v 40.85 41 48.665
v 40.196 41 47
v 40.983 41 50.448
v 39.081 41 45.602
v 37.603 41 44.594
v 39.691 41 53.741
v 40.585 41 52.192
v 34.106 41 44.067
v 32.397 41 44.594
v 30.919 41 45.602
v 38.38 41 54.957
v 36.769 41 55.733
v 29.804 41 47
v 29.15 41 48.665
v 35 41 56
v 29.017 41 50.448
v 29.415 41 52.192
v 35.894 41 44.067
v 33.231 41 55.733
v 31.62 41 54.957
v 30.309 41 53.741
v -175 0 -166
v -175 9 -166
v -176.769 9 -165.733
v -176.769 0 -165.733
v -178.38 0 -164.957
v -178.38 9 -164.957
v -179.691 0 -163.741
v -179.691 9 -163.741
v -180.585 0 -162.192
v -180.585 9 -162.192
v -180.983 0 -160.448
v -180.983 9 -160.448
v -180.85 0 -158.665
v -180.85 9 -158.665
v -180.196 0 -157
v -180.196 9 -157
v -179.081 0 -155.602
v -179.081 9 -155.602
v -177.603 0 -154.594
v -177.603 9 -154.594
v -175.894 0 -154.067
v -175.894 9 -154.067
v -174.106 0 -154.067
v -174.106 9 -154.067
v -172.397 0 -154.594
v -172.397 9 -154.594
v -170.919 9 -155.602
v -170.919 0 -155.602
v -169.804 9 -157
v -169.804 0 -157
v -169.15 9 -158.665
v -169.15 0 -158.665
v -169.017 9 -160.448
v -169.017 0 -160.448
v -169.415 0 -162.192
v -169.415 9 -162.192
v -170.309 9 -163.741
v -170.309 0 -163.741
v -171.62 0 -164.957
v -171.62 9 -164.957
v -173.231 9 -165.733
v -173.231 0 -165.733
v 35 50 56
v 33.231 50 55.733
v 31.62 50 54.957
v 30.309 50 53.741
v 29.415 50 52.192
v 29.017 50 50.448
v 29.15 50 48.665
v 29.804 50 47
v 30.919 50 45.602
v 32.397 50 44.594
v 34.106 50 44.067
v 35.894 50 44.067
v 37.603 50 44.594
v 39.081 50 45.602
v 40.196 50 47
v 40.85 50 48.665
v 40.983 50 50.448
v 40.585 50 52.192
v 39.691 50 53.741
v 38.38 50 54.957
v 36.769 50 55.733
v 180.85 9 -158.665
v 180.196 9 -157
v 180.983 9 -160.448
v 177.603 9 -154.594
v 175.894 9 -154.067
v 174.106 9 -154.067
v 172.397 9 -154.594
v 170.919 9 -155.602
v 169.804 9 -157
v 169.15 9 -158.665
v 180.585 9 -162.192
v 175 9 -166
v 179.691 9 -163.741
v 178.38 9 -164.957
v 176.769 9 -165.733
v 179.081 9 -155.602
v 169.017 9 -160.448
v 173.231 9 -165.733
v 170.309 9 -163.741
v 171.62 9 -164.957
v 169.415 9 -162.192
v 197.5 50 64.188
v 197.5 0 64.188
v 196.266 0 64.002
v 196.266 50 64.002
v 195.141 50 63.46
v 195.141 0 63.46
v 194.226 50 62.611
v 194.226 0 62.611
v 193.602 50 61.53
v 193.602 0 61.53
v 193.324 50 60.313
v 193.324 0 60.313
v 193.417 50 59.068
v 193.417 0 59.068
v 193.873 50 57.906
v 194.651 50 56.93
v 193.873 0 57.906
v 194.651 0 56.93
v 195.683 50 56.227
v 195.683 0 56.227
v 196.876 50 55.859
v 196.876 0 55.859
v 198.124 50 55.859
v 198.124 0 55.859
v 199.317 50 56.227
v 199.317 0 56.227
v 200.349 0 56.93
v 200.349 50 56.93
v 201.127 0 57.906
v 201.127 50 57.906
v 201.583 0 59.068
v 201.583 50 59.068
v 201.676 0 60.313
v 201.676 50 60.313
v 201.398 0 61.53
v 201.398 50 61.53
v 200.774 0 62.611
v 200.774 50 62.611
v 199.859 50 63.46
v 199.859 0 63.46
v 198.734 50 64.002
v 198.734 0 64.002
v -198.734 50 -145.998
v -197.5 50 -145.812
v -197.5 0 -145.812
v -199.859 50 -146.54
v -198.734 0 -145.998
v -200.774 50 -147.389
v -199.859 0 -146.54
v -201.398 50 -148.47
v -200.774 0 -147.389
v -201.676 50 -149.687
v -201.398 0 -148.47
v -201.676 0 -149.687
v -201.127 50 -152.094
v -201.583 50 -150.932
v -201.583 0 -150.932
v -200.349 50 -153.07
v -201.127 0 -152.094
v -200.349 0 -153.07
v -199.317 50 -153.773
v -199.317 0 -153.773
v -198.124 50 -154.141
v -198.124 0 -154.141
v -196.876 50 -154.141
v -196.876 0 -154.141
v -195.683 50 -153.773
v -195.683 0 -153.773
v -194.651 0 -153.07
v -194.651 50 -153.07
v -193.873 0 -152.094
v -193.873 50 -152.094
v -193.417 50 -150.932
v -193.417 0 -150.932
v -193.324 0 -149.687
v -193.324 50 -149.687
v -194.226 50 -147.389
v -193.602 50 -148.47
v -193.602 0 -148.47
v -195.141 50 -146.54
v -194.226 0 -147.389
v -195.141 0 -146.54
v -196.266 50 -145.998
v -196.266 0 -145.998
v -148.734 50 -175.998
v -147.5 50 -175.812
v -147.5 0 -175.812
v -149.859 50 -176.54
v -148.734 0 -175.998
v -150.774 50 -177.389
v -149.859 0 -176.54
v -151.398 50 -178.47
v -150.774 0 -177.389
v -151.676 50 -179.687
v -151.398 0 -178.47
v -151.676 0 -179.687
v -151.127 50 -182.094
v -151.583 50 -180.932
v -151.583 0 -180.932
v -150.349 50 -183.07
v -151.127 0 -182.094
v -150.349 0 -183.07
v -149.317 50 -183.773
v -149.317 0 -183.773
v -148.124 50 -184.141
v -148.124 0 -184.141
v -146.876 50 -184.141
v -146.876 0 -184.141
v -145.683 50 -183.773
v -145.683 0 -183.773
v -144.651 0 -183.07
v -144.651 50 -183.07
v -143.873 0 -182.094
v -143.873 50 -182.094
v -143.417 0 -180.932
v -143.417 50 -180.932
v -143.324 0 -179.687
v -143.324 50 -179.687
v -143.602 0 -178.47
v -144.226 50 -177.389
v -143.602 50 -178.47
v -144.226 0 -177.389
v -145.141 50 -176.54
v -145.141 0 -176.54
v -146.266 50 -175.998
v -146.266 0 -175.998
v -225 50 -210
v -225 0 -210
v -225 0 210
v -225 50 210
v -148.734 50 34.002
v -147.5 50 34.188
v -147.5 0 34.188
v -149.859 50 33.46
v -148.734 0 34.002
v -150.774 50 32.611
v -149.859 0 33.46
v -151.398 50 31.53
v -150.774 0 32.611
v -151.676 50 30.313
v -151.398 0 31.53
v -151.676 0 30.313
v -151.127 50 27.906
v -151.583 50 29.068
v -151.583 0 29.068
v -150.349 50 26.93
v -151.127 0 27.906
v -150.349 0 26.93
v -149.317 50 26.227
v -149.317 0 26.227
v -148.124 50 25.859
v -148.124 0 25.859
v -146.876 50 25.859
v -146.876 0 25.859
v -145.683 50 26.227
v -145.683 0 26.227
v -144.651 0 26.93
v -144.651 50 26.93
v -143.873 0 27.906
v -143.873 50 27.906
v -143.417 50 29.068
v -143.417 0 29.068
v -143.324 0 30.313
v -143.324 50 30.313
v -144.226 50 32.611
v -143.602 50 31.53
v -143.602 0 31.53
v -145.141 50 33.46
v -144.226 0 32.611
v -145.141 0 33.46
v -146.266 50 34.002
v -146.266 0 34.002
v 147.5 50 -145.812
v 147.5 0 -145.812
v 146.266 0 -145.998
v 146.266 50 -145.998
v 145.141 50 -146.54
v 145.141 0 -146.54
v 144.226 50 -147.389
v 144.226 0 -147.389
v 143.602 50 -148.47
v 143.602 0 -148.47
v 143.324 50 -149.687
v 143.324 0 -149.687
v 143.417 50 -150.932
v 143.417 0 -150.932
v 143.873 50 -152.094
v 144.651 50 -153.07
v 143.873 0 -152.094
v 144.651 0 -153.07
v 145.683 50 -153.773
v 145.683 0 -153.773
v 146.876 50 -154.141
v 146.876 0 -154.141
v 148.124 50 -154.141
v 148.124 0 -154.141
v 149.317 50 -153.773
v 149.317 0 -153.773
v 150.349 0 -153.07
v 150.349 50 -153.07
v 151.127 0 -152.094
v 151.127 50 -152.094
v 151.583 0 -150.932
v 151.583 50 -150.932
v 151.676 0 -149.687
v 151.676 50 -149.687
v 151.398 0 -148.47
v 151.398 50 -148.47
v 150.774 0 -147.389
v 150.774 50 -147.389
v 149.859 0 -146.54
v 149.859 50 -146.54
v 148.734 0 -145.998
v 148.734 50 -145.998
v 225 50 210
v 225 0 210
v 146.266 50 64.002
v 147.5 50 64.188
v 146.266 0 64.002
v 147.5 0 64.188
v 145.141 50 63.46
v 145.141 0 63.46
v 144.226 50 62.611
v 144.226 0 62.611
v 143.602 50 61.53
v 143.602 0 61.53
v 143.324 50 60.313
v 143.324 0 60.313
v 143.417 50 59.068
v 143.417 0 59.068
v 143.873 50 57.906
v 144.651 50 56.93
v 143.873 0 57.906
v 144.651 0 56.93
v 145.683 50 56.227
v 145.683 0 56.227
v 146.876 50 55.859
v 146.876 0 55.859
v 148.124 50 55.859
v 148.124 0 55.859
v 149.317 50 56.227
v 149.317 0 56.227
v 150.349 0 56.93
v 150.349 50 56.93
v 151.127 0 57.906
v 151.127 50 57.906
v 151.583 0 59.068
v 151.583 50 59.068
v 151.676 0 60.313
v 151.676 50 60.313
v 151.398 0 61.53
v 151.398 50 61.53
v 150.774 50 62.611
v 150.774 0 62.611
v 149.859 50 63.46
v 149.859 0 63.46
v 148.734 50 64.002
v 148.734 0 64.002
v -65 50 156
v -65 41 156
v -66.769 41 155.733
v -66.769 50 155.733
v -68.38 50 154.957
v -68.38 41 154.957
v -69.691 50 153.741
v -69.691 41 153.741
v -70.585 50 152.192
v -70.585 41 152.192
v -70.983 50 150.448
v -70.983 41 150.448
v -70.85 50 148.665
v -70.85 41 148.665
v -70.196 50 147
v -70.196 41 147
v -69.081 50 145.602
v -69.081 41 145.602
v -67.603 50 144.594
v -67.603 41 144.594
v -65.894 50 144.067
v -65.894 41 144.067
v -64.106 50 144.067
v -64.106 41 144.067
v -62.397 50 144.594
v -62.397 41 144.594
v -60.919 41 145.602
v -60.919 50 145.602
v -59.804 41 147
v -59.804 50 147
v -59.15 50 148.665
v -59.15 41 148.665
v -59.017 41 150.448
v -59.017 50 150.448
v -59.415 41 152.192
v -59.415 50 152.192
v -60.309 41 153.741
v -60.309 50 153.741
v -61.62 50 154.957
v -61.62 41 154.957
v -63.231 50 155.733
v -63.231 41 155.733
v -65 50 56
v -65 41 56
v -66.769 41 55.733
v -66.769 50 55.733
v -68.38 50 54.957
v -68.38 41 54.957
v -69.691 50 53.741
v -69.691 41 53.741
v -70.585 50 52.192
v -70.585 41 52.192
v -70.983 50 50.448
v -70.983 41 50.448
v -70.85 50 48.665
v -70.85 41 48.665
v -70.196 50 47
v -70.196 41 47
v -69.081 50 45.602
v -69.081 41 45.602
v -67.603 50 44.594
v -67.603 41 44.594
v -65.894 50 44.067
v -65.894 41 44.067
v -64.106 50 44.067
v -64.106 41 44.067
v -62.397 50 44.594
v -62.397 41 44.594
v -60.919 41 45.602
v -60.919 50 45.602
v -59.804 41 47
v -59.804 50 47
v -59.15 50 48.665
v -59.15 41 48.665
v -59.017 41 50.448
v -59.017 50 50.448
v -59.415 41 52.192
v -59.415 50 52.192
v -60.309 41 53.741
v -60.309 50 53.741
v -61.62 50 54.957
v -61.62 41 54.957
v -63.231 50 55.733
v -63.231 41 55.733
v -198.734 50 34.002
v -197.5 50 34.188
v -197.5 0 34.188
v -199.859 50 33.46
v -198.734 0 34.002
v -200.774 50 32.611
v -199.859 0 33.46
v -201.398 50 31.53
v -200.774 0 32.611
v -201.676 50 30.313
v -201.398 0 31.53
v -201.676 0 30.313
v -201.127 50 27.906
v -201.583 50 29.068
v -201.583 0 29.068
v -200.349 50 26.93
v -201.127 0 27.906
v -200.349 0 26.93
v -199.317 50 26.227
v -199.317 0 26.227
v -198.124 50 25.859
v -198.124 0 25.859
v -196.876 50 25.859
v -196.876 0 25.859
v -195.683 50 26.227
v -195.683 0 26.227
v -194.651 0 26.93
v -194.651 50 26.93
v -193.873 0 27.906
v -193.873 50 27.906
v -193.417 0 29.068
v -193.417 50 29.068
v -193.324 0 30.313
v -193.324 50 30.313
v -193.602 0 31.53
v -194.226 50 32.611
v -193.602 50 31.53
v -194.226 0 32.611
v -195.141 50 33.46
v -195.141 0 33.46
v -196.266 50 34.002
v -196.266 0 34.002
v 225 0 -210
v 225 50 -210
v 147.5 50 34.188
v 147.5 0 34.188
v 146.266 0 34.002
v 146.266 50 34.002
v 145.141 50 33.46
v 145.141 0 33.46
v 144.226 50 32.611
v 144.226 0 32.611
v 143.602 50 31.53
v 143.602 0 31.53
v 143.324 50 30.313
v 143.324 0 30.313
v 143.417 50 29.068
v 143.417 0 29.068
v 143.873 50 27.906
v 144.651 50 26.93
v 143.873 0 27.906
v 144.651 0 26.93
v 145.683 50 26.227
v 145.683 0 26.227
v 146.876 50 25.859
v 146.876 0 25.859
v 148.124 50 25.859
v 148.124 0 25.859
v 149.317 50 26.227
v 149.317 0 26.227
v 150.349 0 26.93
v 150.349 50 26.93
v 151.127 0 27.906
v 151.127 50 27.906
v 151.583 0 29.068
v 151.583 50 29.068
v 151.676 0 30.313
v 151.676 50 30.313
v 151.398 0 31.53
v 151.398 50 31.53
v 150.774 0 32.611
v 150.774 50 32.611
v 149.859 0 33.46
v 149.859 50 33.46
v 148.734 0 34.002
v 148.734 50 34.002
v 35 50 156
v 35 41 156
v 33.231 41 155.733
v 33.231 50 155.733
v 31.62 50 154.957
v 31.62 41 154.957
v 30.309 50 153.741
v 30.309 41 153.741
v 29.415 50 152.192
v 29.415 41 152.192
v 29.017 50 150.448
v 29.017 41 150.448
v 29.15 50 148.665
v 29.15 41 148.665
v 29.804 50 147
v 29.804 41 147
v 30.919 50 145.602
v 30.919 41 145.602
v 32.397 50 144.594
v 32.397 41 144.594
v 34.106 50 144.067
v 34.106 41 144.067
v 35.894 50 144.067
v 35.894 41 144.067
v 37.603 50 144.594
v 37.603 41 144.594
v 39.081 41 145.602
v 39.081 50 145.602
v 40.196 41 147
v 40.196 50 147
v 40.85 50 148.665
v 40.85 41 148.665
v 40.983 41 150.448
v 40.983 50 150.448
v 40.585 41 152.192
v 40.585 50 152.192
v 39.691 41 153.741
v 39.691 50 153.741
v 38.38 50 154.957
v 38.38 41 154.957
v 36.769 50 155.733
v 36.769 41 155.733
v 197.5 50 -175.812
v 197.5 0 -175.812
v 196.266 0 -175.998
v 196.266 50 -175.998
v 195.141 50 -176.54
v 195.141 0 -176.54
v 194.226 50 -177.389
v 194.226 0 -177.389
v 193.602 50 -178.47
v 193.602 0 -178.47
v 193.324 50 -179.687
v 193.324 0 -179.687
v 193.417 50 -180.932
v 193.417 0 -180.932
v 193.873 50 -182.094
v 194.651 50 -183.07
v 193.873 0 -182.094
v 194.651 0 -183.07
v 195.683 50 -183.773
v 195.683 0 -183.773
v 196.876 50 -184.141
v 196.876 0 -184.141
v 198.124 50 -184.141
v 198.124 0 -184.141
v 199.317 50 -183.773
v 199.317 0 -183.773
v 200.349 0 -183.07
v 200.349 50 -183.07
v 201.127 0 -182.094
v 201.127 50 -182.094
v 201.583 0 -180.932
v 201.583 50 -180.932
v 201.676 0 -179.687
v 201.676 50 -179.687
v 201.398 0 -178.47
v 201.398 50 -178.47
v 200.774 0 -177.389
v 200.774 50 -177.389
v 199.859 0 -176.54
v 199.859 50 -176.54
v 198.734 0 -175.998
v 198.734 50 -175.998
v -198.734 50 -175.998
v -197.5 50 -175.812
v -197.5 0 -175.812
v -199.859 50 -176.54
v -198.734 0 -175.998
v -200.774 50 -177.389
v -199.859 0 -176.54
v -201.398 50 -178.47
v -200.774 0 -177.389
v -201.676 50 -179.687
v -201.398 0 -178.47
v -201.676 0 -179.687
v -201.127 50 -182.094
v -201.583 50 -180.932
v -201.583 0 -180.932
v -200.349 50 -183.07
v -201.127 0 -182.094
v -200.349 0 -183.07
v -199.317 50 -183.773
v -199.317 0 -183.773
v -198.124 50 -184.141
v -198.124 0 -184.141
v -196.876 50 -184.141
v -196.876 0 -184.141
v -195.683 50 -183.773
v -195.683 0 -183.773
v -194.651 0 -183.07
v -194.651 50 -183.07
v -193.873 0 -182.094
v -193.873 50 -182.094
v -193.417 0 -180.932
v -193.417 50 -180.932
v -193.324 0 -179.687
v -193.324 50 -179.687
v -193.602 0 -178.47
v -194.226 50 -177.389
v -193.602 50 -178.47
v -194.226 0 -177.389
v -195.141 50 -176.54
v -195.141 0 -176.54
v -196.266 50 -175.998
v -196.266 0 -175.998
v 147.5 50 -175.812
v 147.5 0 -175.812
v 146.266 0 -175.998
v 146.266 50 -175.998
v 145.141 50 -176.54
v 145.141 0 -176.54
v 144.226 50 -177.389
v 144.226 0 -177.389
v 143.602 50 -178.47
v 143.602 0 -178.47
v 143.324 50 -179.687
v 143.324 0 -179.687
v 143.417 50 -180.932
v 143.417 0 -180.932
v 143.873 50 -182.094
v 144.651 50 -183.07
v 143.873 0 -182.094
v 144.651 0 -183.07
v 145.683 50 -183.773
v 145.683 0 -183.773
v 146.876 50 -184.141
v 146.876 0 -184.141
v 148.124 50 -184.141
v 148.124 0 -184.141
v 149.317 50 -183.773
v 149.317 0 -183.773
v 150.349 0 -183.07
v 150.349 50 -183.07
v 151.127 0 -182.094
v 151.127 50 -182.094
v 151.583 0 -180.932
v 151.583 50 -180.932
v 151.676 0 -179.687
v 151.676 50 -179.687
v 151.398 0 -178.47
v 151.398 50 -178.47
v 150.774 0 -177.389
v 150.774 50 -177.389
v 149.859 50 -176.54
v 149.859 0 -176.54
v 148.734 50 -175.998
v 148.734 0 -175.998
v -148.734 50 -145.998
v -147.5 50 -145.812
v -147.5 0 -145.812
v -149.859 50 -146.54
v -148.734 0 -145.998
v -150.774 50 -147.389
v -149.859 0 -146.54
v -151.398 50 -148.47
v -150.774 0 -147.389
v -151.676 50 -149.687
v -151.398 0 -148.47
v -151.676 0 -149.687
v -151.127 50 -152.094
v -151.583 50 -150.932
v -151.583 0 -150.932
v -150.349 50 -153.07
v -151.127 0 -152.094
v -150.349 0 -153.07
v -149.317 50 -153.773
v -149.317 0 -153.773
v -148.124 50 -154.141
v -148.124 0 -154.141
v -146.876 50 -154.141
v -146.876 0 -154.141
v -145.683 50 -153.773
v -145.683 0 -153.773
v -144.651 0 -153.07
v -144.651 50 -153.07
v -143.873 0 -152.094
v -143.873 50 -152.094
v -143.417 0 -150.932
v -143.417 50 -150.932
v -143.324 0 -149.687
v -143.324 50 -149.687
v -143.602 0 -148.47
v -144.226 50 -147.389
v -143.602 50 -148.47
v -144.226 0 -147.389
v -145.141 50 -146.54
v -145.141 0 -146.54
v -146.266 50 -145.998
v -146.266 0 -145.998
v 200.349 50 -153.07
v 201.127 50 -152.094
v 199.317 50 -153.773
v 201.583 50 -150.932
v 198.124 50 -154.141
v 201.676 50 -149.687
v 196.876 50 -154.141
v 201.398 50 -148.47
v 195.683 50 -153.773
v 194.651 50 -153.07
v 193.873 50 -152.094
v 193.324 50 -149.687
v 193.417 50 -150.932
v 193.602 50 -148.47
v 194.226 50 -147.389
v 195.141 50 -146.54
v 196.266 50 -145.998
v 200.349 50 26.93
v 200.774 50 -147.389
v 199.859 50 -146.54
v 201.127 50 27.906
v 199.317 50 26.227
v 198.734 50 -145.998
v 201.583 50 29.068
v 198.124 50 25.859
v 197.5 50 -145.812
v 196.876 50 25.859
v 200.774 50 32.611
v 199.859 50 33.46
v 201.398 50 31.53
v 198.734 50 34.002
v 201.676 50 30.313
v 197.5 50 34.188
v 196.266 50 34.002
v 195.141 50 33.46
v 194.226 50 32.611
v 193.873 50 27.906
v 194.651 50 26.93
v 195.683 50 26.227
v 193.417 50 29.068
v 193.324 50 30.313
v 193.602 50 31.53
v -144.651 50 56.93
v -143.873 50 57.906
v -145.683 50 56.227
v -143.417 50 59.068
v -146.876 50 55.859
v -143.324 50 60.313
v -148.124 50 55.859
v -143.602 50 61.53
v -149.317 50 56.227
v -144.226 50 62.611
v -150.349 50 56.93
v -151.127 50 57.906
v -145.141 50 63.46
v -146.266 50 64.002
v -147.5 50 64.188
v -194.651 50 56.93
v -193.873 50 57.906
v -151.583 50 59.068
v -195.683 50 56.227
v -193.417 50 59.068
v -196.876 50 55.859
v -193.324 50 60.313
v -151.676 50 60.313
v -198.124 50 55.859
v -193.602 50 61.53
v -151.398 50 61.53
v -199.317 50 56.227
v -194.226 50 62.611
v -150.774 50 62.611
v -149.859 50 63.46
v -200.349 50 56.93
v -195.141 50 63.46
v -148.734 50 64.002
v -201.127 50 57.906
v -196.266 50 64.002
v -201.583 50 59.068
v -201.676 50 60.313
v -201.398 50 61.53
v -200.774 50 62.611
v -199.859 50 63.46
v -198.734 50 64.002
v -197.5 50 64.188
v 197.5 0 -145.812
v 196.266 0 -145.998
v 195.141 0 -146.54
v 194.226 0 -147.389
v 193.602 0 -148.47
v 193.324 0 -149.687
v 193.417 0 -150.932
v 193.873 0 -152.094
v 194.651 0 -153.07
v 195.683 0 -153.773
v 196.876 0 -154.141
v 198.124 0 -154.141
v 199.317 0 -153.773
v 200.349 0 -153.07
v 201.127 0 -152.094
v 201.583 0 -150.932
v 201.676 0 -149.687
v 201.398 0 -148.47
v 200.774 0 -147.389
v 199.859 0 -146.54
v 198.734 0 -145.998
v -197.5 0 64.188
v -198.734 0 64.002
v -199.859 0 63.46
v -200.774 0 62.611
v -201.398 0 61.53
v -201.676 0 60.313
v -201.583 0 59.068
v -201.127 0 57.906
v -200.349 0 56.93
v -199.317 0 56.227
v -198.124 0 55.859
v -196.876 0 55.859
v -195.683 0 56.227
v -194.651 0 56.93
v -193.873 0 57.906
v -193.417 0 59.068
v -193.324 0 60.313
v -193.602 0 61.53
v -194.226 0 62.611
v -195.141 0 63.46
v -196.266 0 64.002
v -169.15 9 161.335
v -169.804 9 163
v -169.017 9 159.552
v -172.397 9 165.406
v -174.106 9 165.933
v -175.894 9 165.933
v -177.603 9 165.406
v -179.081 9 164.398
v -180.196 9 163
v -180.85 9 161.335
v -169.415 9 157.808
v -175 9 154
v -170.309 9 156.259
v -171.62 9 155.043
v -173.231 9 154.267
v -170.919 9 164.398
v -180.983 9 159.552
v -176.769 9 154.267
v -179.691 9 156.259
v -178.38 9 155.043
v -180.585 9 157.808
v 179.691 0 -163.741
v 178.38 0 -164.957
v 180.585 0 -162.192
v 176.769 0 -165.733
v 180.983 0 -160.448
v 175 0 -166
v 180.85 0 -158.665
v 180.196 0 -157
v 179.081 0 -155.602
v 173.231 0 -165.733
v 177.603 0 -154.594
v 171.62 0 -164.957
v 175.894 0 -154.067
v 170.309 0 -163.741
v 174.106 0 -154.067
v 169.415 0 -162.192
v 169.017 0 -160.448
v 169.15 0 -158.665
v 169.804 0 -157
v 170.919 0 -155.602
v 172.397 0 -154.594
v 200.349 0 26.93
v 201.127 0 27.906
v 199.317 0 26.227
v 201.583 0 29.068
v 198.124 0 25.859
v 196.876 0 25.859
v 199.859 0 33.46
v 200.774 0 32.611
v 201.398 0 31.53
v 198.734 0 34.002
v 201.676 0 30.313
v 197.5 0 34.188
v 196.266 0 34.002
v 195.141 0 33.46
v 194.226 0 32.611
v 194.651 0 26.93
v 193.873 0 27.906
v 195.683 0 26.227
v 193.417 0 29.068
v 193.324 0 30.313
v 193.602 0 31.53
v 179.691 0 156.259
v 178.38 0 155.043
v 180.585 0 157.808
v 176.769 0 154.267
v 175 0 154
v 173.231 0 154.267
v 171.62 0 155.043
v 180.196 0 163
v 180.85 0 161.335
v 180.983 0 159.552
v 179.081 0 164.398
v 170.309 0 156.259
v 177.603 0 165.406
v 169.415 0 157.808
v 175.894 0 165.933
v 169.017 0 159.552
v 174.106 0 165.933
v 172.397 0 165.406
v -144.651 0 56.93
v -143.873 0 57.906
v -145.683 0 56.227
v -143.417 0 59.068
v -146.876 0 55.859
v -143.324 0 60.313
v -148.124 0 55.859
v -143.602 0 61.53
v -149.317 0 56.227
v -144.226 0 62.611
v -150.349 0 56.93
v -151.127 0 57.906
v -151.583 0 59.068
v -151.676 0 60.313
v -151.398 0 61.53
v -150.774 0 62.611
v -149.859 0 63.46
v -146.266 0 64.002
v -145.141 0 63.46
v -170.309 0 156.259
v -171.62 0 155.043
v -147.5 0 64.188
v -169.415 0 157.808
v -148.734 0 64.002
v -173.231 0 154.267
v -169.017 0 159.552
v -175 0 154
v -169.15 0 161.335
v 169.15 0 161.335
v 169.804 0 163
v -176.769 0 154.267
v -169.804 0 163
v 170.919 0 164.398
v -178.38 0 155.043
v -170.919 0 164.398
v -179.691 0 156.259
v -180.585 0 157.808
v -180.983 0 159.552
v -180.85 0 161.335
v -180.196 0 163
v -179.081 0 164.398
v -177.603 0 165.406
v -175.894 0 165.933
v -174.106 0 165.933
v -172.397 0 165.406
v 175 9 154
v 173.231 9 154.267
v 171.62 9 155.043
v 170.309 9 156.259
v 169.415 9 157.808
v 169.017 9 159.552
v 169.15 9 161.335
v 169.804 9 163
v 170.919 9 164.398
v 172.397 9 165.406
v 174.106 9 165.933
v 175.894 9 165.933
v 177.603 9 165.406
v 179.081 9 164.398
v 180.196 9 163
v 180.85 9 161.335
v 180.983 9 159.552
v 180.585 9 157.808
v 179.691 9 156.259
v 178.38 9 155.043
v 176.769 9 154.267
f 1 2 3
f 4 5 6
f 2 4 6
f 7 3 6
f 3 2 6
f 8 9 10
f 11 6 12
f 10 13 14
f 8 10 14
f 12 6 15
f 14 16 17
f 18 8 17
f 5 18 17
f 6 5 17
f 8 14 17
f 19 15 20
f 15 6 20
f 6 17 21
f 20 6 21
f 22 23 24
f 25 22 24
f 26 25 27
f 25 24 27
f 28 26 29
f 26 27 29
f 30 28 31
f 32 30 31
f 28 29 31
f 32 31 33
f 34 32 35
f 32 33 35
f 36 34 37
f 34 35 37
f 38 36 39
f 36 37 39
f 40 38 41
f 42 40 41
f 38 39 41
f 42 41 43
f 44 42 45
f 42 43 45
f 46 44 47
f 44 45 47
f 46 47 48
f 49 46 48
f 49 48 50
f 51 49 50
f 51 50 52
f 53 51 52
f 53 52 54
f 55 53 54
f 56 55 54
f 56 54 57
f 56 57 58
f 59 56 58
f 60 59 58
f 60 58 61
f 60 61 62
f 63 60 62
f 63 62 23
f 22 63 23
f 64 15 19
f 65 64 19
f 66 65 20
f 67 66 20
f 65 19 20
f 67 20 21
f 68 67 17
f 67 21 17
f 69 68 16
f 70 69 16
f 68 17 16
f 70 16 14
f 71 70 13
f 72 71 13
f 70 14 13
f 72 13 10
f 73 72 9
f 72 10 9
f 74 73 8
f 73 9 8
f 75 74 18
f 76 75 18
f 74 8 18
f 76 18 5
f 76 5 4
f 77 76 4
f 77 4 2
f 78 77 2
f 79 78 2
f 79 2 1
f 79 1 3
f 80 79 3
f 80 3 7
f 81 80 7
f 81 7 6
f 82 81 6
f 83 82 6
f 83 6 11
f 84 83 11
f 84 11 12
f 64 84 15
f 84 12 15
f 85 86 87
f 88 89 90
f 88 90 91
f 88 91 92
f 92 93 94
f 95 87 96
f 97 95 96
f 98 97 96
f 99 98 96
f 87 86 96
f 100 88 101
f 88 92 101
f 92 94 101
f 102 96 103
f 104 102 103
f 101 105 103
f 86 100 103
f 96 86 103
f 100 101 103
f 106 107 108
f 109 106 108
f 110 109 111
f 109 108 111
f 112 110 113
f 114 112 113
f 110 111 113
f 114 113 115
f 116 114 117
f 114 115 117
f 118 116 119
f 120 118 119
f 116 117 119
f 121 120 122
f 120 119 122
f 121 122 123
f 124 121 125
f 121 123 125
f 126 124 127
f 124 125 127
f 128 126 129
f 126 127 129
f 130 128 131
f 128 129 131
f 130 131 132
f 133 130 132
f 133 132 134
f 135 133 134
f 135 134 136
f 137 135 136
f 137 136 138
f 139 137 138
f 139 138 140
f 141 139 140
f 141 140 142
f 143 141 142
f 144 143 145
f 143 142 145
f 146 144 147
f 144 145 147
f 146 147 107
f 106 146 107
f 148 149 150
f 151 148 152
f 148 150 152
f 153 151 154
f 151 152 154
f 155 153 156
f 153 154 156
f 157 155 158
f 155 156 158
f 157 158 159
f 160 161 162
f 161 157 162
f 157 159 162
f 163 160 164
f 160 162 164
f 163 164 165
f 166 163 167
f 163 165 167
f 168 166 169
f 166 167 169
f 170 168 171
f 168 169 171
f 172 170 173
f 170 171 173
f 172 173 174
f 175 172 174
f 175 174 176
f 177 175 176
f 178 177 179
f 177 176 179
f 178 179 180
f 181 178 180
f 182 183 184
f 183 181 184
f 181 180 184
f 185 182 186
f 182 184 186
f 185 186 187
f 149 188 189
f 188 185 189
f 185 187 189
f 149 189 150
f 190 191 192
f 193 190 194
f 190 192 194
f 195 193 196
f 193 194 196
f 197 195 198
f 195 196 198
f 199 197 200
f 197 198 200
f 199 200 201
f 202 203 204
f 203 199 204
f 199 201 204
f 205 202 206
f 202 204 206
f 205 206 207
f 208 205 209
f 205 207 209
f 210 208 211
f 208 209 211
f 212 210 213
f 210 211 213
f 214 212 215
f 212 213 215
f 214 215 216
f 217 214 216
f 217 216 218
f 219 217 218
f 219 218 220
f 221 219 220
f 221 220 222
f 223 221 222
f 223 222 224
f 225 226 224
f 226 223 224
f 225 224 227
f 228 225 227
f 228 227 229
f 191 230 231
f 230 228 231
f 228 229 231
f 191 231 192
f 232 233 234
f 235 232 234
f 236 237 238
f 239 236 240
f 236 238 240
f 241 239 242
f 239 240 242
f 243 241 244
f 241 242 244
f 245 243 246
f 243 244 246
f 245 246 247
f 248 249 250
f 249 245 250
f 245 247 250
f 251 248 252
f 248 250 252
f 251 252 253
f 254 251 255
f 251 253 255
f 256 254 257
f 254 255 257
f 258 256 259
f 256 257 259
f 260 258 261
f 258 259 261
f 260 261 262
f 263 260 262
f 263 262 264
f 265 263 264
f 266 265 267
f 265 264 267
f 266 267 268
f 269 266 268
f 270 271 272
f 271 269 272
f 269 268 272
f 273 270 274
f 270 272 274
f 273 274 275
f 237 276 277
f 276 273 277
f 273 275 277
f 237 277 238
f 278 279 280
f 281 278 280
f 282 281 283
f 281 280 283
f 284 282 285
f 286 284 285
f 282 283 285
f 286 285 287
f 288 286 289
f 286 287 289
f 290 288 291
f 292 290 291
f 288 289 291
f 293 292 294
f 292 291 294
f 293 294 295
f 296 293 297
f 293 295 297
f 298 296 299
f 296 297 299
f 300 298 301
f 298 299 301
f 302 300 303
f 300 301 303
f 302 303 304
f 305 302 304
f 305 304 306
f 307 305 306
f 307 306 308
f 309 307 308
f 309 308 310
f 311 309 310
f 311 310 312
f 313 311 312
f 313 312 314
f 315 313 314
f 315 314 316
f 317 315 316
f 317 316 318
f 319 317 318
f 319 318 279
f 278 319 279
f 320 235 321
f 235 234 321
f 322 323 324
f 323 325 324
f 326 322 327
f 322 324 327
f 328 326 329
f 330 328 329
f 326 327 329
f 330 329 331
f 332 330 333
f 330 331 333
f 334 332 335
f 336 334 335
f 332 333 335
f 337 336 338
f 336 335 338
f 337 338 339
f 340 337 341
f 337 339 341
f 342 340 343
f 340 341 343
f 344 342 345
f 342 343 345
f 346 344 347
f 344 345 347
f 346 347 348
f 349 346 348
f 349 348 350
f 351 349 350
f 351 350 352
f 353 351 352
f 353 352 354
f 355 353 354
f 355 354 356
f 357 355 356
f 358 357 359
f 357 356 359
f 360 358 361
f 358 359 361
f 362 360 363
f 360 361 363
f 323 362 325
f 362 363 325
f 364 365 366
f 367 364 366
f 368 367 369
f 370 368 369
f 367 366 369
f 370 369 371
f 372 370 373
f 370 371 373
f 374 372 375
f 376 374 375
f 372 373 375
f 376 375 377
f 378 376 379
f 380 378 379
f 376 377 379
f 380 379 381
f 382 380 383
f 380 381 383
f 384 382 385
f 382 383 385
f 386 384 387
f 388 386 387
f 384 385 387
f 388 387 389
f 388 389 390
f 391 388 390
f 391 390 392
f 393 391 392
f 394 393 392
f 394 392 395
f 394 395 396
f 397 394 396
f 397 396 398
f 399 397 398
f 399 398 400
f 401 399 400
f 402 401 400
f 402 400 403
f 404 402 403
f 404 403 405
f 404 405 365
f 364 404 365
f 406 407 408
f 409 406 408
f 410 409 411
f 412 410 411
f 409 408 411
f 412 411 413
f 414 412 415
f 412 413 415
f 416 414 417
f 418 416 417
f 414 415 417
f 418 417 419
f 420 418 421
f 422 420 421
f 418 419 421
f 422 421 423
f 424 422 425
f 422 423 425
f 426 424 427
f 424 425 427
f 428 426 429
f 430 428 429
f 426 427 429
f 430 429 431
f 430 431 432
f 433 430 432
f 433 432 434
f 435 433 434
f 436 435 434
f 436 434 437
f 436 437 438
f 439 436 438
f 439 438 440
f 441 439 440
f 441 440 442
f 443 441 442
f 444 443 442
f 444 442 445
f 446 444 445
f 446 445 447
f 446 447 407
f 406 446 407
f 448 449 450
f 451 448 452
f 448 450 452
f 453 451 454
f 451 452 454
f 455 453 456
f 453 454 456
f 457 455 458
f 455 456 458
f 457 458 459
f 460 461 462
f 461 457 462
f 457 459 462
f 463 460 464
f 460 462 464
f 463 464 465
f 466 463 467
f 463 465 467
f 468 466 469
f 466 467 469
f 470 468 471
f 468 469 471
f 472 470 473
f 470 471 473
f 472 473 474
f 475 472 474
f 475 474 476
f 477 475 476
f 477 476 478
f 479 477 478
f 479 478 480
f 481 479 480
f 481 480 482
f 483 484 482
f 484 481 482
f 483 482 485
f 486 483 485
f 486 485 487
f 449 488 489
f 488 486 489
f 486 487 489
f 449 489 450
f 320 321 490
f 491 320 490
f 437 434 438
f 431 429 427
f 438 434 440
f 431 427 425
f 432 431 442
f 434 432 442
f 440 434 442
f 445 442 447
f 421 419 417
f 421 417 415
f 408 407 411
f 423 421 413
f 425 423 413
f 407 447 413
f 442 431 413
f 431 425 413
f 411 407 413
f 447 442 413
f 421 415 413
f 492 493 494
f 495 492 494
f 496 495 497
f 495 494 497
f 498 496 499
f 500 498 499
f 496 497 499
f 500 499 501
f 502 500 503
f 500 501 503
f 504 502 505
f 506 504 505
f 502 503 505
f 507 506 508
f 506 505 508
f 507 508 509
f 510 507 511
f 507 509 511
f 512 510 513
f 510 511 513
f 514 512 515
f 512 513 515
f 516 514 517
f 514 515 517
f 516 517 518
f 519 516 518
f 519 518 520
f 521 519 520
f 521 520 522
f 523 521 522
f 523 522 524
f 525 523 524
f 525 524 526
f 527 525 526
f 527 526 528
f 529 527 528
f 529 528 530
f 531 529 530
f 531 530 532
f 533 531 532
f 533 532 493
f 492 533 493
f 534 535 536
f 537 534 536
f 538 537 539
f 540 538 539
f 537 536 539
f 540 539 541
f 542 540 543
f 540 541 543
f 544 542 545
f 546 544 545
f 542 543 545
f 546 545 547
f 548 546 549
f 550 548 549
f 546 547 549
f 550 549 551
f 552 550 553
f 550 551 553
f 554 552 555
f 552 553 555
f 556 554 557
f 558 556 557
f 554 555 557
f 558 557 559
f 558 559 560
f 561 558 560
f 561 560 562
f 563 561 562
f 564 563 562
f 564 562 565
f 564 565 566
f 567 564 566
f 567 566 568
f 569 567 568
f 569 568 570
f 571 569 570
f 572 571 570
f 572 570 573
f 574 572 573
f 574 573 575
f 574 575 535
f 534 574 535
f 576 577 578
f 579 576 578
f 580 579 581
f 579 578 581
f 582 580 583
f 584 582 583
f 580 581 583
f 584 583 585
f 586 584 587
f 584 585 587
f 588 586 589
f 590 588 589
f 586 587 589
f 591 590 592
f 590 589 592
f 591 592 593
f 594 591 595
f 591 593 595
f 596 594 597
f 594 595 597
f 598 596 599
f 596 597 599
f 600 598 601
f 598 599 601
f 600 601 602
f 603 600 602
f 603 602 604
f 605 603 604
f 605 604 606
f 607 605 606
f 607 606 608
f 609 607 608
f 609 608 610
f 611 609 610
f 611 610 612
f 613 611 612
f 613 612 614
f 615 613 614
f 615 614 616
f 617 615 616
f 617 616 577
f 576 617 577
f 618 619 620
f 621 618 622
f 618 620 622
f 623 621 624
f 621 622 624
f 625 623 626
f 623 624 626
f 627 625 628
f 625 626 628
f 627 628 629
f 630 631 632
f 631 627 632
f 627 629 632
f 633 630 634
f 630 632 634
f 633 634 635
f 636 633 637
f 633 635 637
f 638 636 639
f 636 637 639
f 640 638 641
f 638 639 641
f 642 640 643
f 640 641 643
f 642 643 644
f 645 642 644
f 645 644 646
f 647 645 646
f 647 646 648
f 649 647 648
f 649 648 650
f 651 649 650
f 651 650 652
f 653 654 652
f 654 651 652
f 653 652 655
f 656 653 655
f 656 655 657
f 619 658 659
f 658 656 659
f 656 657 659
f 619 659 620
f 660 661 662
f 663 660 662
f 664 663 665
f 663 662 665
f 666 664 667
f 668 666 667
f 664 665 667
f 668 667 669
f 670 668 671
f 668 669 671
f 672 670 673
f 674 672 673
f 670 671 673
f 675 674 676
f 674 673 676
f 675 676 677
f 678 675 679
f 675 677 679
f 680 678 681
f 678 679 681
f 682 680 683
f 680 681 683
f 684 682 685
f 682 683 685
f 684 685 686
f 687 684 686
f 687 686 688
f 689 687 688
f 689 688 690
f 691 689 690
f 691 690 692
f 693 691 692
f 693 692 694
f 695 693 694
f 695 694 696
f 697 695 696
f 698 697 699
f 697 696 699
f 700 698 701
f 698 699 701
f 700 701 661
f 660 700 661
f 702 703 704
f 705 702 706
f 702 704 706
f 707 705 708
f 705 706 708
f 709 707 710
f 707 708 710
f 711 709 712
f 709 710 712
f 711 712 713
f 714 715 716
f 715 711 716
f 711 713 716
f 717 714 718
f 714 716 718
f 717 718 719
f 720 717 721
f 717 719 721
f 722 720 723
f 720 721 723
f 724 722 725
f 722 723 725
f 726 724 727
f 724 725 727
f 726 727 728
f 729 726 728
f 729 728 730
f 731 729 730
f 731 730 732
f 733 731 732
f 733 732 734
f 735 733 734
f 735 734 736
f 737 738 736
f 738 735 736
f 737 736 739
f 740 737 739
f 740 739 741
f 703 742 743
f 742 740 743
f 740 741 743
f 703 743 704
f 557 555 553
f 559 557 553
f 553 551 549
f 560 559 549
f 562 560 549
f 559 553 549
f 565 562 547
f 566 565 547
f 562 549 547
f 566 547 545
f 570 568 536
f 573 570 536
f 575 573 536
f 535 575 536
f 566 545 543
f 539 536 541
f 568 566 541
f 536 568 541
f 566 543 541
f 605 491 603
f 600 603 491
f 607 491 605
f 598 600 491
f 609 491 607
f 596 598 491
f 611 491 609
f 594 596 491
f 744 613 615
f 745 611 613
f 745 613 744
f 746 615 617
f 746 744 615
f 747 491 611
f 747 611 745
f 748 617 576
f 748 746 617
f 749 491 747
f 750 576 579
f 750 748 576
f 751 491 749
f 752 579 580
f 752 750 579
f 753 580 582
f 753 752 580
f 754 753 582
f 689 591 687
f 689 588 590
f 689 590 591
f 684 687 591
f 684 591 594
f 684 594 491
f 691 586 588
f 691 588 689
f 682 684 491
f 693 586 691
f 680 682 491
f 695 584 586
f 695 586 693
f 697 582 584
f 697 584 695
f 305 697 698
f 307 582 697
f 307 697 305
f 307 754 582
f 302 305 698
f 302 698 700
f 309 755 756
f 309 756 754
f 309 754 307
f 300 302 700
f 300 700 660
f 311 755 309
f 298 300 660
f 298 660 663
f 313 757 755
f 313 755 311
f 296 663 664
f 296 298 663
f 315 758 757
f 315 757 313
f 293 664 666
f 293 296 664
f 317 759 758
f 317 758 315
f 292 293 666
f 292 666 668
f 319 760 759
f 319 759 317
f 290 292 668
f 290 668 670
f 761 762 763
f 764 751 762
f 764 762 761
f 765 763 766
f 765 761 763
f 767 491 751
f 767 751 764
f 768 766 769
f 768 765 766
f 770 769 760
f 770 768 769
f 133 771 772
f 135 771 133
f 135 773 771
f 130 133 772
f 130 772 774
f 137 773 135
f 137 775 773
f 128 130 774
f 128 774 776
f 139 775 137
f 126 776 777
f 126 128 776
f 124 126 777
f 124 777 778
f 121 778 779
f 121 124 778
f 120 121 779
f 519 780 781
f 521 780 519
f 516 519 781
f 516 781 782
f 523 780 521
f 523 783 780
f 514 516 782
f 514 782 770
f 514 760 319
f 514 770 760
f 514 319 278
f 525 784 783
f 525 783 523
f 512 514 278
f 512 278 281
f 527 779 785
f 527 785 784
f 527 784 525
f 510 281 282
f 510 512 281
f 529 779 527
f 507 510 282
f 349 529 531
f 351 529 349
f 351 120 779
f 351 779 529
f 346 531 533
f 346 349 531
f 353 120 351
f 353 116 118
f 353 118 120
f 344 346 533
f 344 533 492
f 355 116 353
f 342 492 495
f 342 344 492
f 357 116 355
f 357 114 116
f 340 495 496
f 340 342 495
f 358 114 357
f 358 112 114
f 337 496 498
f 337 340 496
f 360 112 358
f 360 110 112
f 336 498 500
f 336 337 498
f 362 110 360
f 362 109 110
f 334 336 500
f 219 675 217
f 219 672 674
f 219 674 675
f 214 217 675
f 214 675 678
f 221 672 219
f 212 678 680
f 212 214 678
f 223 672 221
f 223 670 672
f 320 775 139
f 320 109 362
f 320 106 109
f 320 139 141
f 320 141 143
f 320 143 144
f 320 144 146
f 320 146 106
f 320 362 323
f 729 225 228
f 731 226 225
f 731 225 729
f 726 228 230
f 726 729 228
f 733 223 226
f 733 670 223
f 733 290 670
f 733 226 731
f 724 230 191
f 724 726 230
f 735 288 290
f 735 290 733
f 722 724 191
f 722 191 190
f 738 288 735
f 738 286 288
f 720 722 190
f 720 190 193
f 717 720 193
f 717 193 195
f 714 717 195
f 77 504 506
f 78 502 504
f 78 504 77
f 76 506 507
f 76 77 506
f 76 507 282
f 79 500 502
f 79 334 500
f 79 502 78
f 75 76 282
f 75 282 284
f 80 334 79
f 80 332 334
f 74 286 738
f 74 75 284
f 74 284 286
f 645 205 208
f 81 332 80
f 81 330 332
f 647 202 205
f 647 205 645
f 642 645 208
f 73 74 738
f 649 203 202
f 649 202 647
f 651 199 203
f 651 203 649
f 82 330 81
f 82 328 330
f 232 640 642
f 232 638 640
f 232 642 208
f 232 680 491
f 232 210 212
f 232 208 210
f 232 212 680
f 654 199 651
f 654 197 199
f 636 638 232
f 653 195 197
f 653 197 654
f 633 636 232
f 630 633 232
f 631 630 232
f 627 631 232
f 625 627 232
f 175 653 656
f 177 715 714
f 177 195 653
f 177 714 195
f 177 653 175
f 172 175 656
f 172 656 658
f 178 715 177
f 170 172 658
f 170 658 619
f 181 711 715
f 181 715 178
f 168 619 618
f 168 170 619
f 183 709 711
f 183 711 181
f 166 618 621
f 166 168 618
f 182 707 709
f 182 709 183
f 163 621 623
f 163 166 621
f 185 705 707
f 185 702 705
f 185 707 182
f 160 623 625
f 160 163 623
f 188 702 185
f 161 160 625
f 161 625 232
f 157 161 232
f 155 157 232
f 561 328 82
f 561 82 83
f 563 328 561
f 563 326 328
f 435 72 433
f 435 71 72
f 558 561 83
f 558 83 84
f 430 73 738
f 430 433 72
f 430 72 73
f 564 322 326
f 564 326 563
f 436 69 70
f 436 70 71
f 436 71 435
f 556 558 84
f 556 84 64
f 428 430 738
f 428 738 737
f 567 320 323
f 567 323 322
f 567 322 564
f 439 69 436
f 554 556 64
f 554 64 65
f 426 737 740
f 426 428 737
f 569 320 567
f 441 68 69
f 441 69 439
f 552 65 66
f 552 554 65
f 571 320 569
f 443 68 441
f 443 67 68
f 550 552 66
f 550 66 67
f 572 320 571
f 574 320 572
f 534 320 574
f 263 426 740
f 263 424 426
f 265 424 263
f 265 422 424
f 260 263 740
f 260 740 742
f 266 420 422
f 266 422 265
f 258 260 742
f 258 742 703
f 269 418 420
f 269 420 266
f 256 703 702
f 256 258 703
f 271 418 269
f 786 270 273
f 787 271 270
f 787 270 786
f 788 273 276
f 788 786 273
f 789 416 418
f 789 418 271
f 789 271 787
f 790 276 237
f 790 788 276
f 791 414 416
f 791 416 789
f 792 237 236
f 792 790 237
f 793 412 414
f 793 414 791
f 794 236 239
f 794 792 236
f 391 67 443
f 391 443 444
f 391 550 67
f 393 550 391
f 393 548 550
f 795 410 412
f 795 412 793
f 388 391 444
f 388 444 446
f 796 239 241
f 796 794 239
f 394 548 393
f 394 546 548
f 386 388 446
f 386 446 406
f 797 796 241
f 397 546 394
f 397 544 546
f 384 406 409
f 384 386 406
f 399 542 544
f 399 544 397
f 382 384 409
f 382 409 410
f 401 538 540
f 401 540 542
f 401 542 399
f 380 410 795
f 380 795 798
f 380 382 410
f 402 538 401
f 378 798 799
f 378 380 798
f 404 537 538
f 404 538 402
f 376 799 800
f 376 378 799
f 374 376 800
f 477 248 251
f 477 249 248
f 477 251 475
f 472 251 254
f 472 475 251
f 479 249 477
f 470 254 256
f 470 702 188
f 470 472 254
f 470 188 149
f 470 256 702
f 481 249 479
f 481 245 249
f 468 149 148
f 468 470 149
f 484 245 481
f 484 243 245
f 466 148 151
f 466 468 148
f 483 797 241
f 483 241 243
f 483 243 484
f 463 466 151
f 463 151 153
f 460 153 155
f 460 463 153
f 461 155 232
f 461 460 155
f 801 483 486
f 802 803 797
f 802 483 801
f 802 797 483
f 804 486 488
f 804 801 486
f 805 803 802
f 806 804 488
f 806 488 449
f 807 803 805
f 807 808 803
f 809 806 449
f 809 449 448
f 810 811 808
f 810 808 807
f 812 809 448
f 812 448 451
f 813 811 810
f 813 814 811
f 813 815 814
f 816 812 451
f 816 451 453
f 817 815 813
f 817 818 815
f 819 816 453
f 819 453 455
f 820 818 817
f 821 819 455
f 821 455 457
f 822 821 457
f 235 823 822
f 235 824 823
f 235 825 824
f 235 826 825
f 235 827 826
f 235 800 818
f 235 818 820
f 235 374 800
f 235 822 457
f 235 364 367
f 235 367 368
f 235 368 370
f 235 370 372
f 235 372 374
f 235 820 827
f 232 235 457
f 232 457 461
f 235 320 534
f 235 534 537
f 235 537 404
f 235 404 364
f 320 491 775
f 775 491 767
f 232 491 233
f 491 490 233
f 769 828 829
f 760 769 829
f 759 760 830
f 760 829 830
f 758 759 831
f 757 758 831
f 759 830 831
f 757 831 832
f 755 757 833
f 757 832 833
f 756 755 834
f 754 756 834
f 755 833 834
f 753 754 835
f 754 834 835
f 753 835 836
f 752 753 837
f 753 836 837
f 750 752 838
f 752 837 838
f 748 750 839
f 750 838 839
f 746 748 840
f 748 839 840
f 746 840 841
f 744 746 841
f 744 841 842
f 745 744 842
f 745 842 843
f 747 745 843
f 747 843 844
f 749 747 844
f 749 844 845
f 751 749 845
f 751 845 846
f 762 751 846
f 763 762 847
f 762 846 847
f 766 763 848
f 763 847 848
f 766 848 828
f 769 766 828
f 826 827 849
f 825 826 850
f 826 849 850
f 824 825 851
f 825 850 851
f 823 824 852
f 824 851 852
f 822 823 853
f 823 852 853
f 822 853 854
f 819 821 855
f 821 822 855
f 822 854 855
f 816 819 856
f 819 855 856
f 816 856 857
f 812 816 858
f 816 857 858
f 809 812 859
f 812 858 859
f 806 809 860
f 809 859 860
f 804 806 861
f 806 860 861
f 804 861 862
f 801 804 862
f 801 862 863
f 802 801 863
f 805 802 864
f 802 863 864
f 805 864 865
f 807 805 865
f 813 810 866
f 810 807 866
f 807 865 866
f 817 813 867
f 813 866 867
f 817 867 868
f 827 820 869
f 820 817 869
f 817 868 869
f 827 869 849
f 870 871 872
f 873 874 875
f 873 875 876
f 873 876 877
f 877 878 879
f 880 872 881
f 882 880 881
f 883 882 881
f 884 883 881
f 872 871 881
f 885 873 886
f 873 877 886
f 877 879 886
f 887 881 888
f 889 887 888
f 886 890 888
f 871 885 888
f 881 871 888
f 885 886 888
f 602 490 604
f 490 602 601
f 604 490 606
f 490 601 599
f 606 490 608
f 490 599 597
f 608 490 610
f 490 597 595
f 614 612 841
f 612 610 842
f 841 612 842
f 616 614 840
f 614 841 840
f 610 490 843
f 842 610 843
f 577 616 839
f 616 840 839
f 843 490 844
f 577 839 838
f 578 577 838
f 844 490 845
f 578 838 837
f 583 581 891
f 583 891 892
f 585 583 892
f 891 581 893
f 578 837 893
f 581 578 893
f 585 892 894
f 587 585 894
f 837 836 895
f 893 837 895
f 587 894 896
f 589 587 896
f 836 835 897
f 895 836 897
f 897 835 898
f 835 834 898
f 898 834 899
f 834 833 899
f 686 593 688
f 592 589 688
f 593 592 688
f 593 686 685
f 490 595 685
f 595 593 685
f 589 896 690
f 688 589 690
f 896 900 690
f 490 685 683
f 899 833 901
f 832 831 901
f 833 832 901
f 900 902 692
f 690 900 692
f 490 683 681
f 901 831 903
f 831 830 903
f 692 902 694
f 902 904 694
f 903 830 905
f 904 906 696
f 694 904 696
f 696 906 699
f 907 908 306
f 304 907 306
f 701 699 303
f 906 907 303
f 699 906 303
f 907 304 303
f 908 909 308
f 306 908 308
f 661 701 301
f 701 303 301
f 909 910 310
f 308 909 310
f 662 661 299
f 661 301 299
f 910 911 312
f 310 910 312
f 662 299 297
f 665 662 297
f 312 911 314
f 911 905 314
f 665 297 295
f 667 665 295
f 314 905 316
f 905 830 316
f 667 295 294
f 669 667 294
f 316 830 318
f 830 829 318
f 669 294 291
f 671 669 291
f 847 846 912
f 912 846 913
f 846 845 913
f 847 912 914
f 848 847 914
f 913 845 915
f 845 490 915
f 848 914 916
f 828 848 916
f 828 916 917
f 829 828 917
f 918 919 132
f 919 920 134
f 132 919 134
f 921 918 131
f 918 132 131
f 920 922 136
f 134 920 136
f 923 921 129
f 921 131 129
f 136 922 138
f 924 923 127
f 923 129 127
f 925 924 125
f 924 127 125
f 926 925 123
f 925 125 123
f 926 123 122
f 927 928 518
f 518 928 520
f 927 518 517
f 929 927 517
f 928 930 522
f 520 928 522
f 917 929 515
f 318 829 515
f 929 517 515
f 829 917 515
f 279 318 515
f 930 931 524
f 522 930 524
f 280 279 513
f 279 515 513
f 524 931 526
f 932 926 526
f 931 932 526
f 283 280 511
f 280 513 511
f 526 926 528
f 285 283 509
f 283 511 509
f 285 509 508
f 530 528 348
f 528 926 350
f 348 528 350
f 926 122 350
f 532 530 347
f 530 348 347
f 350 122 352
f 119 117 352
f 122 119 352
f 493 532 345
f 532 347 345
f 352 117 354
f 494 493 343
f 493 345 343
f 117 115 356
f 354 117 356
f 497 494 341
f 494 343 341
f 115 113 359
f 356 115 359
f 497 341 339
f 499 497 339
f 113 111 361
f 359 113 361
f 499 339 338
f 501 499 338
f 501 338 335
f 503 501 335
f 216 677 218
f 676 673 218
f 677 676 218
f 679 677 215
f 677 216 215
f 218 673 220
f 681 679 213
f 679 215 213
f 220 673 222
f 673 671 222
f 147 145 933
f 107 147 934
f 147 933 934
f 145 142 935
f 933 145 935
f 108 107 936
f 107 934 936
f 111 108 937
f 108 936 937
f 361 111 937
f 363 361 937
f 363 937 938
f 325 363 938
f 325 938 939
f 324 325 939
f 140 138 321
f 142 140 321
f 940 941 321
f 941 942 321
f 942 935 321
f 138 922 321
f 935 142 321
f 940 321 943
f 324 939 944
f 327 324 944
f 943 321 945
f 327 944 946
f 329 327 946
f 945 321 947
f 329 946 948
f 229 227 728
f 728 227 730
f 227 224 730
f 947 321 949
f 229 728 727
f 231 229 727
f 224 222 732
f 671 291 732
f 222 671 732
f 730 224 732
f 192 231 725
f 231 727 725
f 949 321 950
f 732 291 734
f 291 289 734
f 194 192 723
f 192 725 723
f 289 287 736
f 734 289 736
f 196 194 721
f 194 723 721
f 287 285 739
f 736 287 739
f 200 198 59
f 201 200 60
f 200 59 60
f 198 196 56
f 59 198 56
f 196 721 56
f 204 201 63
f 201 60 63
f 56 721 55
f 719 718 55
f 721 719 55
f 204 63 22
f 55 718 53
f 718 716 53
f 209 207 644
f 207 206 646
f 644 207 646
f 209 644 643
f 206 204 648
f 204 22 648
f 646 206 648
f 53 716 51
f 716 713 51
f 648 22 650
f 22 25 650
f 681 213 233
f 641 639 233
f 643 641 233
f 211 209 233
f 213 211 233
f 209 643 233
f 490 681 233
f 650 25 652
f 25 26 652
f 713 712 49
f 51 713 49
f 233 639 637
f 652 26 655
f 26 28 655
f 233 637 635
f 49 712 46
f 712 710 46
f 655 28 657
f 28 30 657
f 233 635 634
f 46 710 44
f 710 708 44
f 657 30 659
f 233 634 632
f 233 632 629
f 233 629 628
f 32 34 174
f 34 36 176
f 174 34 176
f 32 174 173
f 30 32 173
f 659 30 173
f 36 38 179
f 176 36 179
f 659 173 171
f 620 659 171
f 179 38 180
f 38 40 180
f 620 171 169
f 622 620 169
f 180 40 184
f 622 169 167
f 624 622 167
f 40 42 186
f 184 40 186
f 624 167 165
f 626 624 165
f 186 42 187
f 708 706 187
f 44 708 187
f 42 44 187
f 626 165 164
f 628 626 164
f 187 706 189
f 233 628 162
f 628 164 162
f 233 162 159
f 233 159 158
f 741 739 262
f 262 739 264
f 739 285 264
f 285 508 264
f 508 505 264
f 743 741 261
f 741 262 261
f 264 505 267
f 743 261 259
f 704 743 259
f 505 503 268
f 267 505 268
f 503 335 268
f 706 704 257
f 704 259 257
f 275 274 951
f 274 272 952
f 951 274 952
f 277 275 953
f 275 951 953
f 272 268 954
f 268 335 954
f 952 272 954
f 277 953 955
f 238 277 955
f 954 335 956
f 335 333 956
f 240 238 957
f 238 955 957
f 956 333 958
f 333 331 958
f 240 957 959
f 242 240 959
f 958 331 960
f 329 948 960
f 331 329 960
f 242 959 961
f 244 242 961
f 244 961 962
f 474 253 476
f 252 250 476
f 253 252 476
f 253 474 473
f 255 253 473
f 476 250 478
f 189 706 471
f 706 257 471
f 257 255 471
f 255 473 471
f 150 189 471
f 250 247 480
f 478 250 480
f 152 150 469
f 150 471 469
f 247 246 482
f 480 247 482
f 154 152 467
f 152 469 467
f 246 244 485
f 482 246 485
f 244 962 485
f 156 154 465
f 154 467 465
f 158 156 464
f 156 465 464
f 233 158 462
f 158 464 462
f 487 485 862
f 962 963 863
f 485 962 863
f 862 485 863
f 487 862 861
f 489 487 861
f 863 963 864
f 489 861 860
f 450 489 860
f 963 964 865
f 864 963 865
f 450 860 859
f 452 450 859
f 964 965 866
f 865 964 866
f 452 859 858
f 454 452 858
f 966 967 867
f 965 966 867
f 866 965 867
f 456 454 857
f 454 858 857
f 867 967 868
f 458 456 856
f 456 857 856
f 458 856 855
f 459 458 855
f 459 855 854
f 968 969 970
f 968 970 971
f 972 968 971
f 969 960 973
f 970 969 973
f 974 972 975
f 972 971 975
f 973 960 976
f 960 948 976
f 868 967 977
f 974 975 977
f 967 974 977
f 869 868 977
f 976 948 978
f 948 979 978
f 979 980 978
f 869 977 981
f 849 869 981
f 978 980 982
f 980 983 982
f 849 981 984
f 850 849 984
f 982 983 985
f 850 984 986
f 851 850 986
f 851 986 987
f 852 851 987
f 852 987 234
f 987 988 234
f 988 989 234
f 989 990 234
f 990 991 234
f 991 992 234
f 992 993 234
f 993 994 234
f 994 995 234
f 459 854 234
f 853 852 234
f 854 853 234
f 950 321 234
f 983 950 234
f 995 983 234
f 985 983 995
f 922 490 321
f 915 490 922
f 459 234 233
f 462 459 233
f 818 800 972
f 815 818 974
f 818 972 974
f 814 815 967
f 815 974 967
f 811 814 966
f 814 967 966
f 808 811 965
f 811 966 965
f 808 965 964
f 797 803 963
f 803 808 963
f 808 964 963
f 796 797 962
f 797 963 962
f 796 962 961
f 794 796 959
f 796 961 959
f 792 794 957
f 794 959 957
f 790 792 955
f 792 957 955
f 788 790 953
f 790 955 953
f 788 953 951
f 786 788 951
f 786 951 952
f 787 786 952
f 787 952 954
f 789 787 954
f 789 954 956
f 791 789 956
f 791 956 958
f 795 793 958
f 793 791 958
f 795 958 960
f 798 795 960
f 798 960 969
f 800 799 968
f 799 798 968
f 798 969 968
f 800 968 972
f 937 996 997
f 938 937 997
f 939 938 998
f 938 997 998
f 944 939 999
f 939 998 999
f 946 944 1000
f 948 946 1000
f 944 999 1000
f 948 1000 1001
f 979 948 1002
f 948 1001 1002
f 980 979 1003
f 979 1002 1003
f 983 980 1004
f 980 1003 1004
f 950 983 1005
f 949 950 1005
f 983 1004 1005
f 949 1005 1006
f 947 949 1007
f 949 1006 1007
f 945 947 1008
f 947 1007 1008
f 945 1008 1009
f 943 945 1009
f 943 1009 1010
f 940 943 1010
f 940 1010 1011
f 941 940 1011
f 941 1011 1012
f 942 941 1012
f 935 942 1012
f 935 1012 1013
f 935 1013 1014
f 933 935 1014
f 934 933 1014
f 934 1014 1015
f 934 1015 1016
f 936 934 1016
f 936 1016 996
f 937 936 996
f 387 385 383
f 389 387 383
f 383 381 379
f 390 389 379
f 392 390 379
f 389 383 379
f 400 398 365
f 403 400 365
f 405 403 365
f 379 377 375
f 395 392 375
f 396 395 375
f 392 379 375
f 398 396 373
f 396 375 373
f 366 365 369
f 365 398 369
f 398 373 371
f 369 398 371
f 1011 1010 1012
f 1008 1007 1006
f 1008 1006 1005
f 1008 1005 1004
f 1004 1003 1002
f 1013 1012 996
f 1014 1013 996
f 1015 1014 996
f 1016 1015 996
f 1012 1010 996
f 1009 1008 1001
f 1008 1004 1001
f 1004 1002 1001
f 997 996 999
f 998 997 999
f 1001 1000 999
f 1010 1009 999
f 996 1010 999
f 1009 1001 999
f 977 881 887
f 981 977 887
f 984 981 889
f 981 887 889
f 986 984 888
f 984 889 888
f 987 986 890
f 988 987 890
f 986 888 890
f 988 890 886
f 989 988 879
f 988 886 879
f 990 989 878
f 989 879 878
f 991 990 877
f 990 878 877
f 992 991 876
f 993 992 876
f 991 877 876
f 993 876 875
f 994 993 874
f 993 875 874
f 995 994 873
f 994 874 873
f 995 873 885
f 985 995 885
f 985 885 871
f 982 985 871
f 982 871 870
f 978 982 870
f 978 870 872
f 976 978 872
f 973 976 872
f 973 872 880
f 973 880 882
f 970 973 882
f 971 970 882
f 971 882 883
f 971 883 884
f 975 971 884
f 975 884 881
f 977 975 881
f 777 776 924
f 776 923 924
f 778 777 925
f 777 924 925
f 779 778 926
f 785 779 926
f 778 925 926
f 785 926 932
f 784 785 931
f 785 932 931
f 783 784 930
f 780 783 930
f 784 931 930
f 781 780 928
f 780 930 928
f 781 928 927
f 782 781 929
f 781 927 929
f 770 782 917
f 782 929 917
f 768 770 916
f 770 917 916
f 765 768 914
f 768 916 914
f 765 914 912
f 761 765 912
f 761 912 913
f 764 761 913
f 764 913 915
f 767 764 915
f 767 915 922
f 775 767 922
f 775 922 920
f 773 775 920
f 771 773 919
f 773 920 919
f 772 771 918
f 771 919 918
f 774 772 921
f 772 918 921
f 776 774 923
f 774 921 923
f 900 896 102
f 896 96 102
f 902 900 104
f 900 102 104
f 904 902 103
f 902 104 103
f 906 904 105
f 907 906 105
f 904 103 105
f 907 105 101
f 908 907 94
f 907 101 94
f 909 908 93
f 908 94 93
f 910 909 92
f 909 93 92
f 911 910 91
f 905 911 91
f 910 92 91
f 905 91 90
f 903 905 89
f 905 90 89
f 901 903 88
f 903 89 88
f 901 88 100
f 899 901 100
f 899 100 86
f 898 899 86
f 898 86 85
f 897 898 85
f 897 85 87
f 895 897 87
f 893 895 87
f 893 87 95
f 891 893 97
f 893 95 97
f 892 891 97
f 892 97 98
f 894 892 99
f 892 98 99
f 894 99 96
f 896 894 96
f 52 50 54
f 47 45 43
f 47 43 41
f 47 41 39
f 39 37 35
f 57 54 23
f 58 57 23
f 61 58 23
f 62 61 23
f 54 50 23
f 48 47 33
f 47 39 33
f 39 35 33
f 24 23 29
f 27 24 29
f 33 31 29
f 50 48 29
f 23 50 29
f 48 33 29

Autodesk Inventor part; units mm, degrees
ref_plane "YZ Plane" through (0, 0, 0) normal (1, 0, 0) x (0, 1, 0)
ref_plane "XZ Plane" through (0, 0, 0) normal (0, 1, 0) x (-1, 0, 0)
ref_plane "XY Plane" through (0, 0, 0) normal (0, 0, 1) x (1, 0, 0)
sketch "Sketch1" plane through (0, 0, 0) normal (0, 1, 0) x (-1, 0, 0)
  line L0 (225, 210) -> (-225, 210)
  line L1 (-225, 210) -> (-225, -210)
  line L2 (-225, -210) -> (225, -210)
  line L3 (225, -210) -> (225, 210)
  line L4 (225, -210) -> (-225, 210) construction
  point P0 (0, 0)
  point P1 (0, 0)
  dimension "d0" = 450
  dimension "d1" = 420
extrude "plyta" add sketch "Sketch1" along normal blind 50
sketch "Sketch3" plane through (0, 0, 0) normal (0, -1, 0) x (1, 0, 0)
  line L0 (225, -210) -> (-225, -210) projected
  line L1 (225, 210) -> (225, -210) projected
  line L2 (-225, -210) -> (-225, 0) projected
  line L3 (0, 210) -> (225, 210) projected
  point P0 (0, 0)
  point P1 (-175, -160)
  point P2 (175, -160)
  point P3 (-175, 160)
  point P4 (175, 160)
  dimension "d18" = 50
  dimension "d19" = 50
  dimension "d20" = 50
  dimension "d21" = 50
hole "Hole2" at (-175, 0, -160) at (175, 0, -160) at (-175, 0, 160) at (175, 0, 160) direction (0, 1, 0) diameter 12 depth 9
sketch "Sketch4" plane through (0, 50, 0) normal (0, 1, 0) x (1, 0, 0)
  line L0 (0, 294) -> (0, -294) construction
  line L1 (-225, -210) -> (225, -210) construction
  point P0 (0, 0)
  point P1 (-65, -150)
  point P2 (35, -150)
  point P3 (-65, -50)
  point P4 (35, -50)
  dimension "d29" = 60
  dimension "d30" = 100
  dimension "d32" = 100
  dimension "d40" = 35
hole "Hole3" at (-65, 50, 150) at (35, 50, 150) at (-65, 50, 50) at (35, 50, 50) direction (0, -1, 0) diameter 12 depth 9
sketch "Sketch5" plane through (0, 50, 0) normal (0, 1, 0) x (1, 0, 0)
  circle A0 centre (197.5, -60) radius 5.75 construction
  circle A1 centre (147.5, -30) radius 5.75 construction
  line L0 (195, 80) -> (215, 80) construction
  line L1 (195, -12.5491) -> (195, 80) construction
  line L2 (150, -12.5491) -> (195, -12.5491) construction
  line L3 (150, 80) -> (150, -12.5491) construction
  line L4 (130, 80) -> (150, 80) construction
  line L5 (130, -80) -> (130, 80) construction
  line L6 (215, -80) -> (130, -80) construction
  line L7 (215, -80) -> (215, 80) construction
  circle A2 centre (147.5, -60) radius 5.75 construction
  circle A3 centre (197.5, -30) radius 5.75 construction
  circle A4 centre (147.5, 150) radius 5.75 construction
  circle A5 centre (197.5, 180) radius 5.75 construction
  line L8 (215, 130) -> (130, 130) construction
  line L9 (215, 130) -> (215, 200) construction
  line L10 (130, 200) -> (215, 200) construction
  line L11 (130, 130) -> (130, 200) construction
  circle A6 centre (147.5, 180) radius 5.75 construction
  circle A7 centre (197.5, 150) radius 5.75 construction
  point P0 (0, 0)
hole "Hole4" at (147.5, 50, 60) at (147.5, 50, 30) at (147.5, 50, -150) at (147.5, 50, -180) at (197.5, 50, -180) at (197.5, 50, -150) at (197.5, 50, 30) at (197.5, 50, 60) direction (0, -1, 0) diameter 8.376 end through all thread size "M10x1.5" class "6H" standard "ISO Metric profile"
mirror "Mirror1" about plane through (0, 0, 0) normal (1, 0, 0) of "Hole4"
equation "\"d20\" = d19"
equation "\"d21\" = d18"
properties part number "KN-00-01-01" material "Granite, Cut, Polished"
